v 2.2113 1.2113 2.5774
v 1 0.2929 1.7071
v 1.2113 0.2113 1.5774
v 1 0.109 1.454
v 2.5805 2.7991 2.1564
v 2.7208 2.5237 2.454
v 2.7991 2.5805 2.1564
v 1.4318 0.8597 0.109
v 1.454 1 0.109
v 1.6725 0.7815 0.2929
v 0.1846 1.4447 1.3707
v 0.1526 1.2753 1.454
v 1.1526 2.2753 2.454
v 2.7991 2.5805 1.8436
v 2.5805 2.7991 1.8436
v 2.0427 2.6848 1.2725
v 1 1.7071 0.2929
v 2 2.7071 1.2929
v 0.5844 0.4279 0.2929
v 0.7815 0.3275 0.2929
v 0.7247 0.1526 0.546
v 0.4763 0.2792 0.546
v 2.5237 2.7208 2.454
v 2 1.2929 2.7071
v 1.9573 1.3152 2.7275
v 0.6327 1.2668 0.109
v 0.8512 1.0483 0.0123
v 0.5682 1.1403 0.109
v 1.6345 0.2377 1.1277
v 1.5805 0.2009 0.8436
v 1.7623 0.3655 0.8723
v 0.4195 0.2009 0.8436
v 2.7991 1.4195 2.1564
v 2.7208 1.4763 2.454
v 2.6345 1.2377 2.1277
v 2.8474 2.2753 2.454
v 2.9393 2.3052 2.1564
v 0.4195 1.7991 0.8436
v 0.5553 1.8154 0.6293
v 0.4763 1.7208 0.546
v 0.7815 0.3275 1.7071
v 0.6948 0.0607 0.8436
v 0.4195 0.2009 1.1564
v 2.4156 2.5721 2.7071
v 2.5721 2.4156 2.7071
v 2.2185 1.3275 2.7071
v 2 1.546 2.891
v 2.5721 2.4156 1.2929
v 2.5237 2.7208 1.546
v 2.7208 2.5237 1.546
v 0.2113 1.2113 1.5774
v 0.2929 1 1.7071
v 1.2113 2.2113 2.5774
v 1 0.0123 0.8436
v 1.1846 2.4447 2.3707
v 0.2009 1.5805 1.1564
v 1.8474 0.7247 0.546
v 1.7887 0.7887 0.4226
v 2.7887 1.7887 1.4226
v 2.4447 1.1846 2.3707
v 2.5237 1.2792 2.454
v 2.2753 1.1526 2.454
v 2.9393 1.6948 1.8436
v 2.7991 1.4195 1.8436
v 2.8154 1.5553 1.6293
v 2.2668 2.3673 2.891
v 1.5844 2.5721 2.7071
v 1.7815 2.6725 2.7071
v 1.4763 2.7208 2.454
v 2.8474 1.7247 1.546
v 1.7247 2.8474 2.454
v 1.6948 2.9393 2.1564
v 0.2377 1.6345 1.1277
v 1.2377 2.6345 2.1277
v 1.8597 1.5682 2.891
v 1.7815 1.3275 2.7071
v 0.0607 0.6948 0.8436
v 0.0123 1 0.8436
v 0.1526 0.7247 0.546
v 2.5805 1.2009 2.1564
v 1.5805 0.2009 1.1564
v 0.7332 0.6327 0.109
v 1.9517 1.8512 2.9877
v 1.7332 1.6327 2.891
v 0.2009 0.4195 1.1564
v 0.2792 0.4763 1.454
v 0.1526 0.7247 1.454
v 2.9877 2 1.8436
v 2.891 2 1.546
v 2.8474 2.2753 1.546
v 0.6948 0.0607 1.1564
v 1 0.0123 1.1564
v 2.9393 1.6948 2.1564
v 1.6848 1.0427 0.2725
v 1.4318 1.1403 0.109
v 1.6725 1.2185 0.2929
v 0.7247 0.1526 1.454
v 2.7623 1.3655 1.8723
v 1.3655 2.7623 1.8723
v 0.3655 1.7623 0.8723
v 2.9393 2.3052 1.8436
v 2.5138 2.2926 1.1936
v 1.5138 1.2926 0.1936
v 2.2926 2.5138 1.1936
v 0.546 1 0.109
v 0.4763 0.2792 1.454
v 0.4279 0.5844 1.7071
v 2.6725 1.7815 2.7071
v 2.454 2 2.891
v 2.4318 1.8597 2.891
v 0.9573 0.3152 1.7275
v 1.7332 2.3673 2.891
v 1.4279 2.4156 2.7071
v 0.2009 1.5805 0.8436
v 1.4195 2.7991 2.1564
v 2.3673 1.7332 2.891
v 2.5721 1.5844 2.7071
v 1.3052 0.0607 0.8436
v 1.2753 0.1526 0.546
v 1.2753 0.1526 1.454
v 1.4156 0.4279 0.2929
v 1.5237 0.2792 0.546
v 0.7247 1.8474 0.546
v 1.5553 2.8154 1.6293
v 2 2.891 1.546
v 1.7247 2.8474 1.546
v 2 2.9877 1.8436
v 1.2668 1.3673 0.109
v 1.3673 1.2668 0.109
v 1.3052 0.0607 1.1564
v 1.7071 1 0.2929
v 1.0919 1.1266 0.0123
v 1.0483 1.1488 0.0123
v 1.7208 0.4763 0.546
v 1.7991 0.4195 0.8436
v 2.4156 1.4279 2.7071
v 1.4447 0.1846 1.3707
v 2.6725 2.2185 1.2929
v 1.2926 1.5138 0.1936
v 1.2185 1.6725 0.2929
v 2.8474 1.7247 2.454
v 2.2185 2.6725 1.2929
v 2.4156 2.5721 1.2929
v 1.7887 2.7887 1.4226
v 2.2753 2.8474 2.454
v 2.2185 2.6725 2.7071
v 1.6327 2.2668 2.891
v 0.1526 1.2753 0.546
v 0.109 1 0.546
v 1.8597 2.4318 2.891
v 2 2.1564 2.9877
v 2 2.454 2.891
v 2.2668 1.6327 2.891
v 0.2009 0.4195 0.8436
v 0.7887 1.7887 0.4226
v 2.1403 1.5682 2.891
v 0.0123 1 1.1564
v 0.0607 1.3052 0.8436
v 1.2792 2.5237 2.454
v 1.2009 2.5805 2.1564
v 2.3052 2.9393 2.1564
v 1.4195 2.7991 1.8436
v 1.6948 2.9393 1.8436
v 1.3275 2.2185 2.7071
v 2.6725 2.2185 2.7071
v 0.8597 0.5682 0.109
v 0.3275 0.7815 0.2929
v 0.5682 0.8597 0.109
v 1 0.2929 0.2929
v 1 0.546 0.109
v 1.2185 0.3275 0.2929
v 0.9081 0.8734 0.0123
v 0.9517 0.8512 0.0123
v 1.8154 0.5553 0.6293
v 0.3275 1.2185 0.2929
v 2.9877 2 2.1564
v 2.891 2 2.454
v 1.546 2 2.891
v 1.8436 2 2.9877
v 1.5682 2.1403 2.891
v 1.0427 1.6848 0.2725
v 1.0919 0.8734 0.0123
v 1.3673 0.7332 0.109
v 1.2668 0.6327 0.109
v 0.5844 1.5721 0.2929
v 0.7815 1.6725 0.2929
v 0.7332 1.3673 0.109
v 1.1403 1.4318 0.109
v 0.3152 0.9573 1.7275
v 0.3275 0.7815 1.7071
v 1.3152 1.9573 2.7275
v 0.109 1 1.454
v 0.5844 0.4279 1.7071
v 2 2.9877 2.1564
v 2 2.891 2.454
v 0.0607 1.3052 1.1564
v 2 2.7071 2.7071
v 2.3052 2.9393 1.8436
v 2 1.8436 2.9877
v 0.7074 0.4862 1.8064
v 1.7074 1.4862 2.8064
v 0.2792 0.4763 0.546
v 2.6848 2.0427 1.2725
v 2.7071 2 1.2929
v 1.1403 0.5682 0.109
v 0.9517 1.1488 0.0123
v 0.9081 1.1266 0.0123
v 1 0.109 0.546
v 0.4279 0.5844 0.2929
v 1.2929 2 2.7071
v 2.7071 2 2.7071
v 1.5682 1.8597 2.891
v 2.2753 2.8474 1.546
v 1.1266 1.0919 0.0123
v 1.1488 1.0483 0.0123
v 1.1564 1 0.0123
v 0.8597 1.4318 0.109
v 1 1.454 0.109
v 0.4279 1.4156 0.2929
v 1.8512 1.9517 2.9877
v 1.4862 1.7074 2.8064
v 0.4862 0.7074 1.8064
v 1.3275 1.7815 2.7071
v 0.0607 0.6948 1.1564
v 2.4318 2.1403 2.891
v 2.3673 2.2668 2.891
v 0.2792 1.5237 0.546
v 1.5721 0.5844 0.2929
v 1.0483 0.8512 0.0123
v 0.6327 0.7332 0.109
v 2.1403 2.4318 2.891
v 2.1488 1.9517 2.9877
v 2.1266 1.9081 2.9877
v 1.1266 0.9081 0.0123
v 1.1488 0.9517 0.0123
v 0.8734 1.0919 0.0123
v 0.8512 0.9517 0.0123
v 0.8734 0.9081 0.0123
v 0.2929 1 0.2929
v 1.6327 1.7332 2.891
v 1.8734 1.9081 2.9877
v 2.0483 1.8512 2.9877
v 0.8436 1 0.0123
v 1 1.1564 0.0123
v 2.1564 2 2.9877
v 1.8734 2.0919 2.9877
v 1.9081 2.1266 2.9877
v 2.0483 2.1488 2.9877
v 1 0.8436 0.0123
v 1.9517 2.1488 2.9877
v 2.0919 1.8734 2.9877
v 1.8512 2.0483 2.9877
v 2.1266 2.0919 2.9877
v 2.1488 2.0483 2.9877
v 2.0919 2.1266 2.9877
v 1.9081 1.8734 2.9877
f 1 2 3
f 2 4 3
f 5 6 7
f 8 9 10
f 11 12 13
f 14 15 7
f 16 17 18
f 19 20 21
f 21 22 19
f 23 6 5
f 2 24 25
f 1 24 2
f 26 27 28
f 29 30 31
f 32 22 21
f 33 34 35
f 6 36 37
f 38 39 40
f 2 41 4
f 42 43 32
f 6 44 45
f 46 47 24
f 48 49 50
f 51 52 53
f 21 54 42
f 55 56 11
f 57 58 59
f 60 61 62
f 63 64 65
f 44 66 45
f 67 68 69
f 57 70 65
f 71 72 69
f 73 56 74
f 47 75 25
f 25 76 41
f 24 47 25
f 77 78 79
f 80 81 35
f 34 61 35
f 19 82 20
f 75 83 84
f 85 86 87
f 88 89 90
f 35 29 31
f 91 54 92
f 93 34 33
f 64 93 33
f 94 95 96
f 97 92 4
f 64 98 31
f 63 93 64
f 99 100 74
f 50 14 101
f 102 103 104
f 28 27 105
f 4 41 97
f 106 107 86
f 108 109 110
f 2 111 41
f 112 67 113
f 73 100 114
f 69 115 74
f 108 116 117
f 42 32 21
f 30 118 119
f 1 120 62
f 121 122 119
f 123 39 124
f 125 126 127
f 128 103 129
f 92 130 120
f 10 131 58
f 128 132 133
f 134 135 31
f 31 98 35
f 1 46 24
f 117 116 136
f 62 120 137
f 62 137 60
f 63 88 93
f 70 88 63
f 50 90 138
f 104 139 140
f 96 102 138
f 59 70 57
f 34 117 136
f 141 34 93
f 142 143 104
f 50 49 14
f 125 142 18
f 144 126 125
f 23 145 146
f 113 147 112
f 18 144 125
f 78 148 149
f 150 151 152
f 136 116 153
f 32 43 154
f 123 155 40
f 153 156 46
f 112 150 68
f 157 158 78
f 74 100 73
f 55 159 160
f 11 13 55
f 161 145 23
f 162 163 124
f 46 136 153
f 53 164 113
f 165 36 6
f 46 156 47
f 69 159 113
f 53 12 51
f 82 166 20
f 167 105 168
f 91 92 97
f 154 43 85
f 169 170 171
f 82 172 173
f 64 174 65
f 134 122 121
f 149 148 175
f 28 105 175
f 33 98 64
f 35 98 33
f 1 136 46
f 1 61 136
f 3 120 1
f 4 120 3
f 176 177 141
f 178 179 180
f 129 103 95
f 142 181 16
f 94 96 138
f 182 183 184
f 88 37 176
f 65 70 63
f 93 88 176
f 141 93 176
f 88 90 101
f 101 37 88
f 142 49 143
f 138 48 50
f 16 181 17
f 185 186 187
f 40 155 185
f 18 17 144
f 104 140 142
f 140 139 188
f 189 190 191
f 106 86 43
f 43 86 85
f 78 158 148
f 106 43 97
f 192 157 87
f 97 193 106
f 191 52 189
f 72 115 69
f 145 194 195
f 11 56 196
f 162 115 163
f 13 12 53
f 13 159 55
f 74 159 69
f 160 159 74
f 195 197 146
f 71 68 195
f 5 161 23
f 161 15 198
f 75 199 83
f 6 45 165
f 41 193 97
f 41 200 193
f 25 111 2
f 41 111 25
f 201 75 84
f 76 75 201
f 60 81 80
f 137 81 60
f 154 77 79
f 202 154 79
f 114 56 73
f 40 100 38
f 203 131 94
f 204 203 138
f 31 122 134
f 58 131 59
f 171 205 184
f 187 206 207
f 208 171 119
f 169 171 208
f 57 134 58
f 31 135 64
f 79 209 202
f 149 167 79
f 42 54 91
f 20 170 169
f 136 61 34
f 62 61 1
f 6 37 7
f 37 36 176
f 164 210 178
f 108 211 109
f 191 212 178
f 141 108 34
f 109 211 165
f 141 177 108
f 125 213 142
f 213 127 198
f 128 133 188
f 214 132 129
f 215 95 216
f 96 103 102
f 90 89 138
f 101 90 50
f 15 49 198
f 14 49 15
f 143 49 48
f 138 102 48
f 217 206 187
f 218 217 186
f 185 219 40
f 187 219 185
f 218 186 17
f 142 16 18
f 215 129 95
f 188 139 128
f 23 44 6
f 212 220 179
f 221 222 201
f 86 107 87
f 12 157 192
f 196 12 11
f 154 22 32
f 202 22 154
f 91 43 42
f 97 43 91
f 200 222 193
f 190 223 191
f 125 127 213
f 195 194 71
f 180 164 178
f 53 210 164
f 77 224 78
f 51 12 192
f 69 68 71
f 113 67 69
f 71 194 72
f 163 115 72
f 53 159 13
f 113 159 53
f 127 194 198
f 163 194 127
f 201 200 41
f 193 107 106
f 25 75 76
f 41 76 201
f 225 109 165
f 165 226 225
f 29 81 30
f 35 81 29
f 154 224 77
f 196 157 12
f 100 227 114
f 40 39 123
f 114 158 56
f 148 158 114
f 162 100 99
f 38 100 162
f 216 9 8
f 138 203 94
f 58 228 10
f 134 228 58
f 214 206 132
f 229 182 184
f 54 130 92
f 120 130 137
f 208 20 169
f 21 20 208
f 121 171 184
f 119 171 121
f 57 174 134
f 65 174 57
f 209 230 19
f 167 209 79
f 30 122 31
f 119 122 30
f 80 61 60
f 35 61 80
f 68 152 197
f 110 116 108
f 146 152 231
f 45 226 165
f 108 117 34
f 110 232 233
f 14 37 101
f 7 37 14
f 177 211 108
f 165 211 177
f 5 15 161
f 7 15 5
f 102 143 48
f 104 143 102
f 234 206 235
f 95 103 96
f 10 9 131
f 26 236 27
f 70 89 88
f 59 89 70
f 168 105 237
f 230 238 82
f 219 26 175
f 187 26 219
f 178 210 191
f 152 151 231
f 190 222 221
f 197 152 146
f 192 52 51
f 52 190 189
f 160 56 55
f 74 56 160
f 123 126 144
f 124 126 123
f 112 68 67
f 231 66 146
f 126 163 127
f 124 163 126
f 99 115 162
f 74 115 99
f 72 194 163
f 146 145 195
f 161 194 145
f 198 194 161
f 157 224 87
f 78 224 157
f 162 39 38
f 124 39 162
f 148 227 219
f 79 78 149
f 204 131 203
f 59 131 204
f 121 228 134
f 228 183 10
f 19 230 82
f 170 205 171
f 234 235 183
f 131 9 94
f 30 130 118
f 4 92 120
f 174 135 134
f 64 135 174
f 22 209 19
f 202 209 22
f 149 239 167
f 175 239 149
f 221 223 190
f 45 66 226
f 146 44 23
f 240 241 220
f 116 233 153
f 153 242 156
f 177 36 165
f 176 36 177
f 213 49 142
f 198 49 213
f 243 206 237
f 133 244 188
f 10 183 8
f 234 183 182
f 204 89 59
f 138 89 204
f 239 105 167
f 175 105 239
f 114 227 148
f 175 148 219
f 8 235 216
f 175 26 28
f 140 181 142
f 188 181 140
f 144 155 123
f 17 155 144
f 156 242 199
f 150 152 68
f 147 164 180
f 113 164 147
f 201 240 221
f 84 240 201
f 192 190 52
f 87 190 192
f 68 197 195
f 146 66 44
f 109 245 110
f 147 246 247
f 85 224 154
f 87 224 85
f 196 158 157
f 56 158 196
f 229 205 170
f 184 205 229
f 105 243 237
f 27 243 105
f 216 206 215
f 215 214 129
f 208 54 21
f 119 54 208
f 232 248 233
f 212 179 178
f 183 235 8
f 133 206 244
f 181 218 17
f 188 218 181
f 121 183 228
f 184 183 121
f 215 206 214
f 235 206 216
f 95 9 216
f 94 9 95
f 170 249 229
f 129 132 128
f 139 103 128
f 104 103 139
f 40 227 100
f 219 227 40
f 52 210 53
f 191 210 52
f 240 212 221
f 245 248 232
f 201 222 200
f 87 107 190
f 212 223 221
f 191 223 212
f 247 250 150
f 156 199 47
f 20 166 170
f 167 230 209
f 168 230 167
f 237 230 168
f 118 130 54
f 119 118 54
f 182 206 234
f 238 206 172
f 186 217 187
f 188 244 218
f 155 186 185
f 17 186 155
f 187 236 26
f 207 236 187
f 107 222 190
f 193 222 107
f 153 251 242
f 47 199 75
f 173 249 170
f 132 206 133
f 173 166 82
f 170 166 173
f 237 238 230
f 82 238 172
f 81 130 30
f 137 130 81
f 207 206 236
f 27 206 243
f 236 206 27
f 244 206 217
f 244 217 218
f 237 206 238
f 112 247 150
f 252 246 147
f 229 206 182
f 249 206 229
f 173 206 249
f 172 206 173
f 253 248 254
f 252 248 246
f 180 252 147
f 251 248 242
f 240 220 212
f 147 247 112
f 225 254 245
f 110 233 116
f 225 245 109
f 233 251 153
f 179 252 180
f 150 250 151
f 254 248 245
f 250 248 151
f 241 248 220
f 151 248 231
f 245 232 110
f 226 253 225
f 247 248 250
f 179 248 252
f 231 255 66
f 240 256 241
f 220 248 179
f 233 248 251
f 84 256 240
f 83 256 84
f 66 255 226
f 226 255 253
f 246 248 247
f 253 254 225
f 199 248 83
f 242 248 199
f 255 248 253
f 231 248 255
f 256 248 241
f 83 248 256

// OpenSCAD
$fn=20;

module cylinder_from_two_points(p1,p2,r=1)
{
	v=p2-p1;
	h = sqrt(v[0]*v[0] + v[1]*v[1] + v[2]*v[2]);
	mirrorplane = [0,0,h]-v;
	translate(p1) mirror(mirrorplane) cylinder(h=h,r=r,center=false);
}

module sphere_from_point(p,r=1)
{
	translate(p) sphere(r=r,center=true);
}

module capped_cylinder(p1, p2, r) {
	hull() {
		translate(p1)sphere(r=r,center=true);
		translate(p2)sphere(r=r,center=true);
	}
}

p0=[0,0,0];
p1=[1,1,1];
p2=[2,2,2];

hull(){
cylinder_from_two_points(p1,p2);
sphere_from_point(p1);
sphere_from_point(p2);
};
